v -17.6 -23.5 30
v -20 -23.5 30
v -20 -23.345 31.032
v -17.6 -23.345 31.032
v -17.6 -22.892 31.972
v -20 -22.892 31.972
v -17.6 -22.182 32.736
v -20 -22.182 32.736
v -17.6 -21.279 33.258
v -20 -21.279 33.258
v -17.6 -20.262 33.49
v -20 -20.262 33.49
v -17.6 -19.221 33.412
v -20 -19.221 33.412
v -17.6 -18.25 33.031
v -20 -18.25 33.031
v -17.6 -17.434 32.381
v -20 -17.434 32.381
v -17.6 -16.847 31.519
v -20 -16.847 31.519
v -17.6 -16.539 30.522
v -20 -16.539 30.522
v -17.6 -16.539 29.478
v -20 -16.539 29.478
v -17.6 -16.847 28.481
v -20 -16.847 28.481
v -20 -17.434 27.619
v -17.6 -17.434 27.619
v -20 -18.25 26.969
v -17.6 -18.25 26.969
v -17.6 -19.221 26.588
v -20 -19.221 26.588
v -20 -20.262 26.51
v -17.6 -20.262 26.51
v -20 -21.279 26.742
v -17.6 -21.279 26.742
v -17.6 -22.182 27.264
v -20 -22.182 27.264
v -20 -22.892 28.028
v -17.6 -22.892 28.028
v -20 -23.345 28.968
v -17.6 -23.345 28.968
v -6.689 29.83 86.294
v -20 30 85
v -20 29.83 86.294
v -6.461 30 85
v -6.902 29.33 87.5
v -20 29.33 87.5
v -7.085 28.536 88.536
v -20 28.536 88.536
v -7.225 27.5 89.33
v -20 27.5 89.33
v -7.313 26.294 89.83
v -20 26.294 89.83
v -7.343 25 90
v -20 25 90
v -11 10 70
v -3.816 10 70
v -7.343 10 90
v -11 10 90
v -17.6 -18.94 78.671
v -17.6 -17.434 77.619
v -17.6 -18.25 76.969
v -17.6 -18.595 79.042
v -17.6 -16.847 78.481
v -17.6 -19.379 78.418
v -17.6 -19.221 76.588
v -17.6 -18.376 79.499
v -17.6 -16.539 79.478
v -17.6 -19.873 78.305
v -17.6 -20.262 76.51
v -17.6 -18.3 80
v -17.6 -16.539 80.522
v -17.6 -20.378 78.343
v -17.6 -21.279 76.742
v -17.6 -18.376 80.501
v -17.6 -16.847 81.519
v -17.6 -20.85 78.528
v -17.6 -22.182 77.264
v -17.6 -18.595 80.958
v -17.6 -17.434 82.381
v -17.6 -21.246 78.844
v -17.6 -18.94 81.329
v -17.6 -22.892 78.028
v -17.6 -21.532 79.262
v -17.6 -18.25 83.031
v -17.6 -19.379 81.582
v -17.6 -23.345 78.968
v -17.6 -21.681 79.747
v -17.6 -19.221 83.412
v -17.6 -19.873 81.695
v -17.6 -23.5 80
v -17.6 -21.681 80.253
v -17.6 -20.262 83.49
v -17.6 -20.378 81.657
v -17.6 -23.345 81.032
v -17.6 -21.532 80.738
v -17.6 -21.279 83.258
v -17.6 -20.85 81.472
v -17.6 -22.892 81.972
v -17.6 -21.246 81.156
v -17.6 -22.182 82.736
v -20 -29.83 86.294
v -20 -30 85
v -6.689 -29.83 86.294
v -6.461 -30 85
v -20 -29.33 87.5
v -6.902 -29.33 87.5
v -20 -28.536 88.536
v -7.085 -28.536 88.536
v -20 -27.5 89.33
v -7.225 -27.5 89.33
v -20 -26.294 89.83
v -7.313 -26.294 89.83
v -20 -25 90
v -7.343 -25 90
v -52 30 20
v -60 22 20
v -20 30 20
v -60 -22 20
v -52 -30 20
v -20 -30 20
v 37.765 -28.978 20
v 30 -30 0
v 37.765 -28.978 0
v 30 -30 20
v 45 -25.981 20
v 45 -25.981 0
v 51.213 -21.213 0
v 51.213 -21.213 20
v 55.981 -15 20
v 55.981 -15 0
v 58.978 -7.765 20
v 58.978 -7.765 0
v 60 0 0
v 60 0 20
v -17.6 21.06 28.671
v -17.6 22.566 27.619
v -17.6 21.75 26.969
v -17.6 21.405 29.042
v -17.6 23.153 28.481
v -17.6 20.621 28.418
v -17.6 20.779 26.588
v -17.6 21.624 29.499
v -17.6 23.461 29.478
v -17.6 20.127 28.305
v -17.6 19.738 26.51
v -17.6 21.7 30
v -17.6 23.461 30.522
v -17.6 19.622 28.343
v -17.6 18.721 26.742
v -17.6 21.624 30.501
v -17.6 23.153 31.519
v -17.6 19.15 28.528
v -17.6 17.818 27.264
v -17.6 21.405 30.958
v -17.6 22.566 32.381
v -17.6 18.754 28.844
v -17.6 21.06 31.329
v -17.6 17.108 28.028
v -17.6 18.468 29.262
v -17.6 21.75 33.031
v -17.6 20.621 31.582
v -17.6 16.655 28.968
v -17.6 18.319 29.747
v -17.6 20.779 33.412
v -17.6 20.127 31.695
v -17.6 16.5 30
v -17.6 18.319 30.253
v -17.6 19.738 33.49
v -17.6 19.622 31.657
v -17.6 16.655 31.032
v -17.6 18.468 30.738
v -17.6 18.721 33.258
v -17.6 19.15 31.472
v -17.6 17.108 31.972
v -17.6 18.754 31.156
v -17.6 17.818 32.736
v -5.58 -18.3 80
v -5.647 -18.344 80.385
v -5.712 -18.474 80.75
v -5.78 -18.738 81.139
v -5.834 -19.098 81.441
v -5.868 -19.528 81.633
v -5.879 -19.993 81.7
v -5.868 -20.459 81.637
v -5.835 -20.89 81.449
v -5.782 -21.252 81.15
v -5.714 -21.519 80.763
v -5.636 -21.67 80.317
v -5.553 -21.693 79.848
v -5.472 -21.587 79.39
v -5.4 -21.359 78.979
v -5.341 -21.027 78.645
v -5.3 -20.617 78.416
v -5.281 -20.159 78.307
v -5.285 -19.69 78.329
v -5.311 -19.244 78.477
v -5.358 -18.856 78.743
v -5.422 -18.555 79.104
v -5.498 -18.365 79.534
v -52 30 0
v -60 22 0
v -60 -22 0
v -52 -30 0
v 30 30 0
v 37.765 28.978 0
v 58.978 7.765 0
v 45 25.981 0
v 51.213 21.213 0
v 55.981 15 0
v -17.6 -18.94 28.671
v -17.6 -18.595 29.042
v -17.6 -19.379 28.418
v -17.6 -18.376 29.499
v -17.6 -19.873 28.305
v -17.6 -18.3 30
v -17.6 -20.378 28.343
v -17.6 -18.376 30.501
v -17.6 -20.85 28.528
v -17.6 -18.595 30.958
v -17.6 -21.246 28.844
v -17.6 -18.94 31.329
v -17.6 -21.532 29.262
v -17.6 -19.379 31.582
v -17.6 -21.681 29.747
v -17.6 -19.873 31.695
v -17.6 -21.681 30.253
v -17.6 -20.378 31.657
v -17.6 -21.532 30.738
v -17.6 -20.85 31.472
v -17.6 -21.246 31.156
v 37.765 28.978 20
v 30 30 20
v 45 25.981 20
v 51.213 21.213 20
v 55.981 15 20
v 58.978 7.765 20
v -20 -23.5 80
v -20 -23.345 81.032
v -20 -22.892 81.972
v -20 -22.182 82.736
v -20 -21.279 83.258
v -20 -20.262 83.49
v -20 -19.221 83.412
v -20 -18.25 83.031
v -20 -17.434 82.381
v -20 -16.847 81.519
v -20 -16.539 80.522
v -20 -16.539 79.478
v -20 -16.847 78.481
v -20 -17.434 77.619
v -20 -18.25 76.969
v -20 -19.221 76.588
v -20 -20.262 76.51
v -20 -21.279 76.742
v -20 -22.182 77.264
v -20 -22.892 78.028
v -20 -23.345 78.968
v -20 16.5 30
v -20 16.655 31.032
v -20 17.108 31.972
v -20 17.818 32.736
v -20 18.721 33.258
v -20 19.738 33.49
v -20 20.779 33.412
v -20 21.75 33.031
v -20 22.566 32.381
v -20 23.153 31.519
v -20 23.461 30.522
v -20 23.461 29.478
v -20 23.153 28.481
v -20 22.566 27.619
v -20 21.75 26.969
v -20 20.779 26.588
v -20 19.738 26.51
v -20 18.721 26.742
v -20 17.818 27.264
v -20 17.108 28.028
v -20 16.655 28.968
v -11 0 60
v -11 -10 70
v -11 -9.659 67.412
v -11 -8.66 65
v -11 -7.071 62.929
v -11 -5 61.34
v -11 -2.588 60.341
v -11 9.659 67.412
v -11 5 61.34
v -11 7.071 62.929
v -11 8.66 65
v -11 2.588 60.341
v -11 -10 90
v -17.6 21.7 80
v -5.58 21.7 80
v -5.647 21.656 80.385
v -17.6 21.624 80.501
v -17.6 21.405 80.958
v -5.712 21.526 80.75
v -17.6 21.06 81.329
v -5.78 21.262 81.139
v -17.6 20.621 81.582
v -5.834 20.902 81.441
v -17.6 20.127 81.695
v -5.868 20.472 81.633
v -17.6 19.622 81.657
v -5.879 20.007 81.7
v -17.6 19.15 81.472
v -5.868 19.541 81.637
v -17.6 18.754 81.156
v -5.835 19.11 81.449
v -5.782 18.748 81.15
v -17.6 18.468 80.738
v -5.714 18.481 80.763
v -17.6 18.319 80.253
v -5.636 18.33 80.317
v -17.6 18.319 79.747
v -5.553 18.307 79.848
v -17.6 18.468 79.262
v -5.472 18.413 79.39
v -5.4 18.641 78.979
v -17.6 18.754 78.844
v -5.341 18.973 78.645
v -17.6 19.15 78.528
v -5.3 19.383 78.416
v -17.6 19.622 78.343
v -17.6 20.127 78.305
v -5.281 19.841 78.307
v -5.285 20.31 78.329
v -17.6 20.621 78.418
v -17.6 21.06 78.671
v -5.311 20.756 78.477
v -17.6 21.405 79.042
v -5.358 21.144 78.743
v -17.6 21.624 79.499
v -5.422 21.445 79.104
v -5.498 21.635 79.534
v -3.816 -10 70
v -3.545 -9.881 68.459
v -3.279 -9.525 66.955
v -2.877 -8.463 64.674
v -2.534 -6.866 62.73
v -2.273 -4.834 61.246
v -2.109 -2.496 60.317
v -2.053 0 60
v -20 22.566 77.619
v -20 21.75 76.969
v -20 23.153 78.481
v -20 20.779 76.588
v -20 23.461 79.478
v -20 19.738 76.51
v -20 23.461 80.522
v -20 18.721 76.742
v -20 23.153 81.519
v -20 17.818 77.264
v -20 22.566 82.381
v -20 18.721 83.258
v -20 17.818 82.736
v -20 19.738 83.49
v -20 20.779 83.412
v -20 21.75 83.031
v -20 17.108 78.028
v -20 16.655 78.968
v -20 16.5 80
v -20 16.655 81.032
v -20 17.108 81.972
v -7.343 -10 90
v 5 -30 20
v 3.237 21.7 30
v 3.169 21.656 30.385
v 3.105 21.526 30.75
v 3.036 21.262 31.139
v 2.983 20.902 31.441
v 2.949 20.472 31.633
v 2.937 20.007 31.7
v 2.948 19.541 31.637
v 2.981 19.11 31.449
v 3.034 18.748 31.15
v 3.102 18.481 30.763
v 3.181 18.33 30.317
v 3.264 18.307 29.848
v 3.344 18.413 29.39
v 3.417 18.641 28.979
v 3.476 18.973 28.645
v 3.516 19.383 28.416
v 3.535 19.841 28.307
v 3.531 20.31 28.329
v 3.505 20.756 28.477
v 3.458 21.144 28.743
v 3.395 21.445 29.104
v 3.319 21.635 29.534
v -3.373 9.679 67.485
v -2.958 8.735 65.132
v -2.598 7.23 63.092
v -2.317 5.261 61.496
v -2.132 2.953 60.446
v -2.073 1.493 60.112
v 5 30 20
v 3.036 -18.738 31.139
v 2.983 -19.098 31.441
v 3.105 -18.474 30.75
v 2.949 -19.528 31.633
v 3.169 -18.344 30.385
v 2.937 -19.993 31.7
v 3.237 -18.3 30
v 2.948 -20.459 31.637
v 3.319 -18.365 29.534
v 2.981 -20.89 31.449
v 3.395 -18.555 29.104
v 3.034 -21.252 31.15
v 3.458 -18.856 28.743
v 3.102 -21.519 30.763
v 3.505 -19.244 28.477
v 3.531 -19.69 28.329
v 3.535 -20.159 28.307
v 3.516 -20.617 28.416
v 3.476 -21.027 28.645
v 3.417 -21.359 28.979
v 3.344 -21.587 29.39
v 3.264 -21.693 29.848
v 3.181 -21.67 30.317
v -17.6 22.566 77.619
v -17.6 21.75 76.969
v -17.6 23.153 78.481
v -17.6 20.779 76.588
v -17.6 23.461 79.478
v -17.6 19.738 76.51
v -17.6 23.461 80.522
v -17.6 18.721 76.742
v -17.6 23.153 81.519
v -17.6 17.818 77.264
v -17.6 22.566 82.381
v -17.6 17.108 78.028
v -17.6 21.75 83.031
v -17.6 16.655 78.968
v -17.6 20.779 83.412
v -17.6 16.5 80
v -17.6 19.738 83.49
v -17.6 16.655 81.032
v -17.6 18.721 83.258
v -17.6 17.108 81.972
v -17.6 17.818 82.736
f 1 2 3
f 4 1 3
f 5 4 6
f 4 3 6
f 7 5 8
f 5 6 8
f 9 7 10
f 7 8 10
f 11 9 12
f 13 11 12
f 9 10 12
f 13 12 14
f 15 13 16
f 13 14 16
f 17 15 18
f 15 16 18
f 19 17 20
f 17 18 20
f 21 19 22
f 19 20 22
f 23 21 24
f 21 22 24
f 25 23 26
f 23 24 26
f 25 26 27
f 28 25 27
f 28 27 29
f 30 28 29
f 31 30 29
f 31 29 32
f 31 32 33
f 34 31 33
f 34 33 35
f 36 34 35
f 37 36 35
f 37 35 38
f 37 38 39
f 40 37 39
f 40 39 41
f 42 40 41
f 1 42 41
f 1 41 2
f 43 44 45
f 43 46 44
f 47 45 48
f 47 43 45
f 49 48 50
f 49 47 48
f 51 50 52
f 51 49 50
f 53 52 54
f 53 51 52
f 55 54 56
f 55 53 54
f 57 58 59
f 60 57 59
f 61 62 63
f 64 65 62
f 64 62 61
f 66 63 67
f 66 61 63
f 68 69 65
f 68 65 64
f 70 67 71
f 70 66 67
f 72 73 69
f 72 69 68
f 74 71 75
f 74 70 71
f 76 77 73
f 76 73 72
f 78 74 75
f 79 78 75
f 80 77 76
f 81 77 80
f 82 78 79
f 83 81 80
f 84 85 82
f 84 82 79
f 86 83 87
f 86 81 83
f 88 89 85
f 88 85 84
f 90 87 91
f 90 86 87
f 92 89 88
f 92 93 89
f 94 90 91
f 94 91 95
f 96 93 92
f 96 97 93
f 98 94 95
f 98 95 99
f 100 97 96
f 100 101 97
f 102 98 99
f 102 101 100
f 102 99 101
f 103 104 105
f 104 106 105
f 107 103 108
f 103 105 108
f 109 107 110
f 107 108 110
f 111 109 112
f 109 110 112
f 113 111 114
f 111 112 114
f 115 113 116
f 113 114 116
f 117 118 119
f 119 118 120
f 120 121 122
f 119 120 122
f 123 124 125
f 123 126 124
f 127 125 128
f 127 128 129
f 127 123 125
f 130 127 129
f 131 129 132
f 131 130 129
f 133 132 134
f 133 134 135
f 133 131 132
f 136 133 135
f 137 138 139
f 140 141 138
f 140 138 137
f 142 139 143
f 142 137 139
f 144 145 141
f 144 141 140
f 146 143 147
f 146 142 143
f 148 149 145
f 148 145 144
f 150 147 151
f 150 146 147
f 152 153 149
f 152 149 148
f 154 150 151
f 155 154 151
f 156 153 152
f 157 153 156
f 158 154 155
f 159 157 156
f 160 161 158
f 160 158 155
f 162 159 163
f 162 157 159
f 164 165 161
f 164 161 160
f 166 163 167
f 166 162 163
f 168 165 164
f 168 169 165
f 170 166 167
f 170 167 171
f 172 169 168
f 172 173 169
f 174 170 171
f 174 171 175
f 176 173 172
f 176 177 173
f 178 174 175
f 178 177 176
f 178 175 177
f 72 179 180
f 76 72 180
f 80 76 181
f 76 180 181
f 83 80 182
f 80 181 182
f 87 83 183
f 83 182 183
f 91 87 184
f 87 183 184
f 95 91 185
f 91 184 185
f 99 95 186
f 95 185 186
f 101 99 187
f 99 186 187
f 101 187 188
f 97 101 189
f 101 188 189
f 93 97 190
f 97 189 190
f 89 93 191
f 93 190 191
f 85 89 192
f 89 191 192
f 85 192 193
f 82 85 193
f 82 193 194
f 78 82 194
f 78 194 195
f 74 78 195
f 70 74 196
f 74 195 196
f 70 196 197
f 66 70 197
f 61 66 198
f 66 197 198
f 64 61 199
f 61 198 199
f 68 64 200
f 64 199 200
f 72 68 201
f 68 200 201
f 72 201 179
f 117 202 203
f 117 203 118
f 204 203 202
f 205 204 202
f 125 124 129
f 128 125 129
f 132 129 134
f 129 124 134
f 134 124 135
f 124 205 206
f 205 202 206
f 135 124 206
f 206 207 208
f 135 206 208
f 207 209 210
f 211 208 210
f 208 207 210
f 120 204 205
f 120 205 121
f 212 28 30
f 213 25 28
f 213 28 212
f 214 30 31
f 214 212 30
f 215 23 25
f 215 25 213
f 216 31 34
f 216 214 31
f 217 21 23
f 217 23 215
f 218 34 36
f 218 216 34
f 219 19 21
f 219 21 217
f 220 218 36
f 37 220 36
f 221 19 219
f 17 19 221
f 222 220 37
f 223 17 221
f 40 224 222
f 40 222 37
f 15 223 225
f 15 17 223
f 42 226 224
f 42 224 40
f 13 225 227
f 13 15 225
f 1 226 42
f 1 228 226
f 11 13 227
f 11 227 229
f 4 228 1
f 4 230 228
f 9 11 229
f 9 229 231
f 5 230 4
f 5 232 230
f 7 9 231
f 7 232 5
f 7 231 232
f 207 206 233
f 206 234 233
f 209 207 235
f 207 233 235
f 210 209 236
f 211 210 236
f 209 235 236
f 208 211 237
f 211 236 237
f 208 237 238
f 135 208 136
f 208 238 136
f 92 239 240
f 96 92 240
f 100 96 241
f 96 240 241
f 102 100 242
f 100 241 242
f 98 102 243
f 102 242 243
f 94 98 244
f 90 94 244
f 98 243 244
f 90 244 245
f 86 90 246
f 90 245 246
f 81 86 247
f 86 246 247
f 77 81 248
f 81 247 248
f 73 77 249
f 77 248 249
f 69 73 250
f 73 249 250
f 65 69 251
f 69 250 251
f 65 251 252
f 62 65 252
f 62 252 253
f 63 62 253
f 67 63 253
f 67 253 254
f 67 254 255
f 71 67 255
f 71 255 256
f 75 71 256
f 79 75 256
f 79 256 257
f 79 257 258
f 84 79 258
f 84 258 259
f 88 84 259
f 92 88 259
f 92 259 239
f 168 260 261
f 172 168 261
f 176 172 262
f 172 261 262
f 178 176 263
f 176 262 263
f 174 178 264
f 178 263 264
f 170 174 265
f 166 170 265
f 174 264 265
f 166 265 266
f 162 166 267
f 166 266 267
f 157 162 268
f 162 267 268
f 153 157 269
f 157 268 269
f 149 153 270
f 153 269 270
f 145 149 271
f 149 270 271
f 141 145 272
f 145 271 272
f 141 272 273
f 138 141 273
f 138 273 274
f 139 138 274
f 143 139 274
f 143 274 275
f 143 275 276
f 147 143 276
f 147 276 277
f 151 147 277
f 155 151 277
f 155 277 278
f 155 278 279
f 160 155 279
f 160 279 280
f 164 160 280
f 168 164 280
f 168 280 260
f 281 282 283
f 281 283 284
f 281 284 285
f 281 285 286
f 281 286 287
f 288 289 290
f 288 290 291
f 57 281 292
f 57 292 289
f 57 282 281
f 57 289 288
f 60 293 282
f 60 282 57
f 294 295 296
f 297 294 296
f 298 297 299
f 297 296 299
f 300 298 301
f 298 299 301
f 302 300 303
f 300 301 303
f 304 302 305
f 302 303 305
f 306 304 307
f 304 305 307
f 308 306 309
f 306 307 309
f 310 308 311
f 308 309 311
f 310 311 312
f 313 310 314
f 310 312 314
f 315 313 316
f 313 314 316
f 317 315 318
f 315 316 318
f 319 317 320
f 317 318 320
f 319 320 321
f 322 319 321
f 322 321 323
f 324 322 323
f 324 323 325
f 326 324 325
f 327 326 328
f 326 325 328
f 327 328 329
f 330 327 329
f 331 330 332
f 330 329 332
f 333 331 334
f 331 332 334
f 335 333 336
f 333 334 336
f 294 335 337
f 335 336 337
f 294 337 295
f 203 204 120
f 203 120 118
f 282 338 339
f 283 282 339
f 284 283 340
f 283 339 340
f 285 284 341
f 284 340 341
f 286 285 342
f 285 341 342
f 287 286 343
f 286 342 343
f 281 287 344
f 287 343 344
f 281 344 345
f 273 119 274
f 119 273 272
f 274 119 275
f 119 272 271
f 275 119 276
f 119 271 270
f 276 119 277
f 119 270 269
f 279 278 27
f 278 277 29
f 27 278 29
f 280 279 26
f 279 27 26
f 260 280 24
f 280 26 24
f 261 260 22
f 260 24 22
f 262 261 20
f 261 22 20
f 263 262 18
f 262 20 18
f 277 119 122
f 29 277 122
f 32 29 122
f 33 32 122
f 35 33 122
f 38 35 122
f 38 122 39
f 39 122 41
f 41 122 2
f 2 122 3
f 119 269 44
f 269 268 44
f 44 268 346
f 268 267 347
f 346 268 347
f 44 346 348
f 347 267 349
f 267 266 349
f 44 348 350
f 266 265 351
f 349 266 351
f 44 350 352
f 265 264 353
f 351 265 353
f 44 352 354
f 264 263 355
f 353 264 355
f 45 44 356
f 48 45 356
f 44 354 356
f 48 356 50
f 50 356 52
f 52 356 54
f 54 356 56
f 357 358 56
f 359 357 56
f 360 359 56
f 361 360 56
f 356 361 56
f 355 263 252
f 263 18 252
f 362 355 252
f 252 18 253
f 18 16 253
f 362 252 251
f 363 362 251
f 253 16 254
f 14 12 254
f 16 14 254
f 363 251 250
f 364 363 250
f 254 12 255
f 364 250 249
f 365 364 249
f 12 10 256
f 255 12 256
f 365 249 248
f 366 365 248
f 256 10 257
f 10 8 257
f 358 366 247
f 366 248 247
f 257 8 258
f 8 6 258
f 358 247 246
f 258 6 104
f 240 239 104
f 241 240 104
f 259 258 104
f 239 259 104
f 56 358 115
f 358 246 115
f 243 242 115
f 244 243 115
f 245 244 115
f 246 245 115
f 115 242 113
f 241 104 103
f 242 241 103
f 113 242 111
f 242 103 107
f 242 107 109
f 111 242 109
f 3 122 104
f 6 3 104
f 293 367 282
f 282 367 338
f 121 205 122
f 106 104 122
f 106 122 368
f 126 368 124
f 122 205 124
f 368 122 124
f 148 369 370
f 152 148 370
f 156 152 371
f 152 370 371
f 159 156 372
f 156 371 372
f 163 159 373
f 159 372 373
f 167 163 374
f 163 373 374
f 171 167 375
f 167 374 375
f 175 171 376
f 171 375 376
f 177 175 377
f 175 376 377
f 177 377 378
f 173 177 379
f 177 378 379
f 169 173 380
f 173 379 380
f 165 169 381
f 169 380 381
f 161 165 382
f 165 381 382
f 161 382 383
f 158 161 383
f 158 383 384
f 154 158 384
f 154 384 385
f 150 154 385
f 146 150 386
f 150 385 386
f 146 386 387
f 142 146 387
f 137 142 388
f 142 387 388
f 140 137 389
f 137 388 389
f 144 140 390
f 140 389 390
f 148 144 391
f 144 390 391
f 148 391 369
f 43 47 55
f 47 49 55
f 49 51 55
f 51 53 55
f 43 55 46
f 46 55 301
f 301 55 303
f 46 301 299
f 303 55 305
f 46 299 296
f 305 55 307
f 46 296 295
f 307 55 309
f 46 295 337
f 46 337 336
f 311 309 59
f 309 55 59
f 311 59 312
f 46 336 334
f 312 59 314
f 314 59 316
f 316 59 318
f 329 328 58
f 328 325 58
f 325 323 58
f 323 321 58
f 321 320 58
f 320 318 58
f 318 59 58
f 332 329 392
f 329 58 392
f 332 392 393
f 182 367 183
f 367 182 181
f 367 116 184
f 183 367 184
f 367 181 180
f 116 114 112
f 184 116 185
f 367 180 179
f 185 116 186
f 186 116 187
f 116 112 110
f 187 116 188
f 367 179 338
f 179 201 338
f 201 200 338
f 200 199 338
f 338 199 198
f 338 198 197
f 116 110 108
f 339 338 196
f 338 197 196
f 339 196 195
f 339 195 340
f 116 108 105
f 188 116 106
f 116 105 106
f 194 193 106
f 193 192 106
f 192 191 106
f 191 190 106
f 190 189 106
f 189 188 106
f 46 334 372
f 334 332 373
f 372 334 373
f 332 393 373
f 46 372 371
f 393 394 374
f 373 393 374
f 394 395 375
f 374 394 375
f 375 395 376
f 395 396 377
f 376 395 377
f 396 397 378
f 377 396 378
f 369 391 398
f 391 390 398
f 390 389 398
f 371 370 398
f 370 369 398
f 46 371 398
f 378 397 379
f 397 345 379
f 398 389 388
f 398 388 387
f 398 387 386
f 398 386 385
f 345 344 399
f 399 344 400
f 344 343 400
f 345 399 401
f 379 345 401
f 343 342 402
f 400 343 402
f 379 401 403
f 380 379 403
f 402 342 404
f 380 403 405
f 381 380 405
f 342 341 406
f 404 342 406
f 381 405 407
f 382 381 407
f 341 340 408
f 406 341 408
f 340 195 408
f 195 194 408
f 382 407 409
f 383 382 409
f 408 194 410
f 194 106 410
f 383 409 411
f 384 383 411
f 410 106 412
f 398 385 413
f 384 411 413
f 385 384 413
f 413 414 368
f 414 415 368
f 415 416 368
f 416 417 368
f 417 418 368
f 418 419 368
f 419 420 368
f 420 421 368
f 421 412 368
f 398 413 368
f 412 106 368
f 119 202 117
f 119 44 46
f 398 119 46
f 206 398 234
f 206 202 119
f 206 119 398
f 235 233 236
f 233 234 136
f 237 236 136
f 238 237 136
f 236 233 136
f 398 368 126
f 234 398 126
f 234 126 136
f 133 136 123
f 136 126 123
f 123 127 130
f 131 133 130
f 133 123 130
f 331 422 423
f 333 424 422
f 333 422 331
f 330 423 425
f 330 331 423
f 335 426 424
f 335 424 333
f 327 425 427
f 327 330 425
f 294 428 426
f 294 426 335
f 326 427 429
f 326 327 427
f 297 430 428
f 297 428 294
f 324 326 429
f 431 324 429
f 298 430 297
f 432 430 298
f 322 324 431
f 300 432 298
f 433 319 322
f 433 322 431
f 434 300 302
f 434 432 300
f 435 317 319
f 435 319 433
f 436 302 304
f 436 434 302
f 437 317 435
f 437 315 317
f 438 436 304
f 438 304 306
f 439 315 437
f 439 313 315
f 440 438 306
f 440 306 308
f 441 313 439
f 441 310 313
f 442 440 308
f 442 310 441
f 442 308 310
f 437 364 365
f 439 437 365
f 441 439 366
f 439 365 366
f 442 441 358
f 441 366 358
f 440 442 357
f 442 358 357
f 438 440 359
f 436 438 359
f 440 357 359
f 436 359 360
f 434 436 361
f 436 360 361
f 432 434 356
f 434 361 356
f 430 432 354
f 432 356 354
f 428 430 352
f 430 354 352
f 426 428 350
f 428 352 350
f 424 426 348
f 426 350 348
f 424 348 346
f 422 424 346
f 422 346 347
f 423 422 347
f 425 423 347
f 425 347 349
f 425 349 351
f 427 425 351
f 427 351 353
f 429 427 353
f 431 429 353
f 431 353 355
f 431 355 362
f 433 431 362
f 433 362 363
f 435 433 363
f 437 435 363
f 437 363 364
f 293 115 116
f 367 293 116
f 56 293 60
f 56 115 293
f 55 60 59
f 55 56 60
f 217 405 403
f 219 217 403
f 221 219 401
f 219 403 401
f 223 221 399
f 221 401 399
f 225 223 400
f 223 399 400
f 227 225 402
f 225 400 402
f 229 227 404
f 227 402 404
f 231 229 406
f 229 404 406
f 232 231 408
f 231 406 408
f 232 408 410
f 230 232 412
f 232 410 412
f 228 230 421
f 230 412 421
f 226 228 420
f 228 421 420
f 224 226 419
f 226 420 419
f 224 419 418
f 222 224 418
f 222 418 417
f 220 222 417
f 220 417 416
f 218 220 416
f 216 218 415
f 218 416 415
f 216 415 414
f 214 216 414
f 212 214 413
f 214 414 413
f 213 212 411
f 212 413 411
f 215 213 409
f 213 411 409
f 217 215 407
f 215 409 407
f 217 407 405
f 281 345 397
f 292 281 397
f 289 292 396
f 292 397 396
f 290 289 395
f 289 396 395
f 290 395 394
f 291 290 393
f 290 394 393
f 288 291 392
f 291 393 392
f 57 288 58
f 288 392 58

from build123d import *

# Parameters (mm, degrees)
F0_W           = 120
F0_H           = 60
F1_DEPTH       = 90
F2_W           = 40
F2_H           = 70
F2_W_2         = 55
F3_DEPTH       = 60.001
F4_R           = 29.99999
F5_SIZE        = 8
F7_D           = 3.4
F7_CBORE_D     = 7
F7_CBORE_DEPTH = 2.4
F9_DEPTH       = 16
F11_DEPTH      = 60.001
F12_R          = 5


# Not quite as in the source:
# - a fillet or chamfer is up to 0.001 mm smaller than in the source, because OpenCascade refuses the exact size


with BuildPart() as f1:
    # F0 (on Top) → F1 (new body)
    with BuildSketch(Plane.XY):
        Rectangle(F0_W, F0_H)
    extrude(amount=F1_DEPTH)

    # F2 (on face) → F3 (cut, through all)
    with BuildSketch(Plane.XZ.offset(30)):
        with Locations((-40, 55)):
            Rectangle(F2_W, F2_H)
        with Locations((32.5, 55)):
            Rectangle(F2_W_2, F2_H)
    extrude(amount=-F3_DEPTH, mode=Mode.SUBTRACT)

    # F4 (radius 30 in the source; OpenCascade refuses exactly that, so slightly less here)
    f4_edges = [f1.edges().sort_by_distance(p)[0] for p in [
        (60, -30, 10),
        (60, 30, 10),
    ]]
    fillet(f4_edges, radius=F4_R)

    # F5
    f5_edges = [f1.edges().sort_by_distance(p)[0] for p in [
        (-60, -30, 10),
        (-60, 30, 10),
    ]]
    chamfer(f5_edges, length=F5_SIZE)

    # F7 (through all)
    with Locations(Plane(origin=(-20, 0, 0), x_dir=(0, -1, 0), z_dir=(-1, 0, 0))):
        with Locations((-20, 80), (20, 80), (20, 30), (-20, 30)):
            CounterBoreHole(F7_D / 2, F7_CBORE_D / 2, F7_CBORE_DEPTH)

    # F8 (on face) → F9 (cut)
    with BuildSketch(Plane.YZ.offset(5)):
        with BuildLine():
            ThreePointArc((10, 70), (0, 80), (-10, 70))
            ThreePointArc((-10, 70), (-7.0710678119, 62.9289321881), (0, 60))
            ThreePointArc((0, 60), (7.0710678119, 62.9289321881), (10, 70))
        make_face()
        with BuildLine():
            Line((10, 90), (-10, 90))
            Line((-10, 90), (-10, 70))
            ThreePointArc((-10, 70), (0, 80), (10, 70))
            Line((10, 70), (10, 90))
        make_face()
    extrude(amount=-F9_DEPTH, mode=Mode.SUBTRACT)

    # F10 (on face) → F11 (cut, through all)
    with BuildSketch(Plane.XZ.offset(30)):
        Polygon((5, 90), (-7.3428886496, 90), (5, 20), align=None)
    extrude(amount=-F11_DEPTH, mode=Mode.SUBTRACT)

    # F12
    f12_edges = [f1.edges().sort_by_distance(p)[0] for p in [
        (-13.671444, -30, 90),
        (-13.671444, 30, 90),
    ]]
    fillet(f12_edges, radius=F12_R)


solid = f1.part
